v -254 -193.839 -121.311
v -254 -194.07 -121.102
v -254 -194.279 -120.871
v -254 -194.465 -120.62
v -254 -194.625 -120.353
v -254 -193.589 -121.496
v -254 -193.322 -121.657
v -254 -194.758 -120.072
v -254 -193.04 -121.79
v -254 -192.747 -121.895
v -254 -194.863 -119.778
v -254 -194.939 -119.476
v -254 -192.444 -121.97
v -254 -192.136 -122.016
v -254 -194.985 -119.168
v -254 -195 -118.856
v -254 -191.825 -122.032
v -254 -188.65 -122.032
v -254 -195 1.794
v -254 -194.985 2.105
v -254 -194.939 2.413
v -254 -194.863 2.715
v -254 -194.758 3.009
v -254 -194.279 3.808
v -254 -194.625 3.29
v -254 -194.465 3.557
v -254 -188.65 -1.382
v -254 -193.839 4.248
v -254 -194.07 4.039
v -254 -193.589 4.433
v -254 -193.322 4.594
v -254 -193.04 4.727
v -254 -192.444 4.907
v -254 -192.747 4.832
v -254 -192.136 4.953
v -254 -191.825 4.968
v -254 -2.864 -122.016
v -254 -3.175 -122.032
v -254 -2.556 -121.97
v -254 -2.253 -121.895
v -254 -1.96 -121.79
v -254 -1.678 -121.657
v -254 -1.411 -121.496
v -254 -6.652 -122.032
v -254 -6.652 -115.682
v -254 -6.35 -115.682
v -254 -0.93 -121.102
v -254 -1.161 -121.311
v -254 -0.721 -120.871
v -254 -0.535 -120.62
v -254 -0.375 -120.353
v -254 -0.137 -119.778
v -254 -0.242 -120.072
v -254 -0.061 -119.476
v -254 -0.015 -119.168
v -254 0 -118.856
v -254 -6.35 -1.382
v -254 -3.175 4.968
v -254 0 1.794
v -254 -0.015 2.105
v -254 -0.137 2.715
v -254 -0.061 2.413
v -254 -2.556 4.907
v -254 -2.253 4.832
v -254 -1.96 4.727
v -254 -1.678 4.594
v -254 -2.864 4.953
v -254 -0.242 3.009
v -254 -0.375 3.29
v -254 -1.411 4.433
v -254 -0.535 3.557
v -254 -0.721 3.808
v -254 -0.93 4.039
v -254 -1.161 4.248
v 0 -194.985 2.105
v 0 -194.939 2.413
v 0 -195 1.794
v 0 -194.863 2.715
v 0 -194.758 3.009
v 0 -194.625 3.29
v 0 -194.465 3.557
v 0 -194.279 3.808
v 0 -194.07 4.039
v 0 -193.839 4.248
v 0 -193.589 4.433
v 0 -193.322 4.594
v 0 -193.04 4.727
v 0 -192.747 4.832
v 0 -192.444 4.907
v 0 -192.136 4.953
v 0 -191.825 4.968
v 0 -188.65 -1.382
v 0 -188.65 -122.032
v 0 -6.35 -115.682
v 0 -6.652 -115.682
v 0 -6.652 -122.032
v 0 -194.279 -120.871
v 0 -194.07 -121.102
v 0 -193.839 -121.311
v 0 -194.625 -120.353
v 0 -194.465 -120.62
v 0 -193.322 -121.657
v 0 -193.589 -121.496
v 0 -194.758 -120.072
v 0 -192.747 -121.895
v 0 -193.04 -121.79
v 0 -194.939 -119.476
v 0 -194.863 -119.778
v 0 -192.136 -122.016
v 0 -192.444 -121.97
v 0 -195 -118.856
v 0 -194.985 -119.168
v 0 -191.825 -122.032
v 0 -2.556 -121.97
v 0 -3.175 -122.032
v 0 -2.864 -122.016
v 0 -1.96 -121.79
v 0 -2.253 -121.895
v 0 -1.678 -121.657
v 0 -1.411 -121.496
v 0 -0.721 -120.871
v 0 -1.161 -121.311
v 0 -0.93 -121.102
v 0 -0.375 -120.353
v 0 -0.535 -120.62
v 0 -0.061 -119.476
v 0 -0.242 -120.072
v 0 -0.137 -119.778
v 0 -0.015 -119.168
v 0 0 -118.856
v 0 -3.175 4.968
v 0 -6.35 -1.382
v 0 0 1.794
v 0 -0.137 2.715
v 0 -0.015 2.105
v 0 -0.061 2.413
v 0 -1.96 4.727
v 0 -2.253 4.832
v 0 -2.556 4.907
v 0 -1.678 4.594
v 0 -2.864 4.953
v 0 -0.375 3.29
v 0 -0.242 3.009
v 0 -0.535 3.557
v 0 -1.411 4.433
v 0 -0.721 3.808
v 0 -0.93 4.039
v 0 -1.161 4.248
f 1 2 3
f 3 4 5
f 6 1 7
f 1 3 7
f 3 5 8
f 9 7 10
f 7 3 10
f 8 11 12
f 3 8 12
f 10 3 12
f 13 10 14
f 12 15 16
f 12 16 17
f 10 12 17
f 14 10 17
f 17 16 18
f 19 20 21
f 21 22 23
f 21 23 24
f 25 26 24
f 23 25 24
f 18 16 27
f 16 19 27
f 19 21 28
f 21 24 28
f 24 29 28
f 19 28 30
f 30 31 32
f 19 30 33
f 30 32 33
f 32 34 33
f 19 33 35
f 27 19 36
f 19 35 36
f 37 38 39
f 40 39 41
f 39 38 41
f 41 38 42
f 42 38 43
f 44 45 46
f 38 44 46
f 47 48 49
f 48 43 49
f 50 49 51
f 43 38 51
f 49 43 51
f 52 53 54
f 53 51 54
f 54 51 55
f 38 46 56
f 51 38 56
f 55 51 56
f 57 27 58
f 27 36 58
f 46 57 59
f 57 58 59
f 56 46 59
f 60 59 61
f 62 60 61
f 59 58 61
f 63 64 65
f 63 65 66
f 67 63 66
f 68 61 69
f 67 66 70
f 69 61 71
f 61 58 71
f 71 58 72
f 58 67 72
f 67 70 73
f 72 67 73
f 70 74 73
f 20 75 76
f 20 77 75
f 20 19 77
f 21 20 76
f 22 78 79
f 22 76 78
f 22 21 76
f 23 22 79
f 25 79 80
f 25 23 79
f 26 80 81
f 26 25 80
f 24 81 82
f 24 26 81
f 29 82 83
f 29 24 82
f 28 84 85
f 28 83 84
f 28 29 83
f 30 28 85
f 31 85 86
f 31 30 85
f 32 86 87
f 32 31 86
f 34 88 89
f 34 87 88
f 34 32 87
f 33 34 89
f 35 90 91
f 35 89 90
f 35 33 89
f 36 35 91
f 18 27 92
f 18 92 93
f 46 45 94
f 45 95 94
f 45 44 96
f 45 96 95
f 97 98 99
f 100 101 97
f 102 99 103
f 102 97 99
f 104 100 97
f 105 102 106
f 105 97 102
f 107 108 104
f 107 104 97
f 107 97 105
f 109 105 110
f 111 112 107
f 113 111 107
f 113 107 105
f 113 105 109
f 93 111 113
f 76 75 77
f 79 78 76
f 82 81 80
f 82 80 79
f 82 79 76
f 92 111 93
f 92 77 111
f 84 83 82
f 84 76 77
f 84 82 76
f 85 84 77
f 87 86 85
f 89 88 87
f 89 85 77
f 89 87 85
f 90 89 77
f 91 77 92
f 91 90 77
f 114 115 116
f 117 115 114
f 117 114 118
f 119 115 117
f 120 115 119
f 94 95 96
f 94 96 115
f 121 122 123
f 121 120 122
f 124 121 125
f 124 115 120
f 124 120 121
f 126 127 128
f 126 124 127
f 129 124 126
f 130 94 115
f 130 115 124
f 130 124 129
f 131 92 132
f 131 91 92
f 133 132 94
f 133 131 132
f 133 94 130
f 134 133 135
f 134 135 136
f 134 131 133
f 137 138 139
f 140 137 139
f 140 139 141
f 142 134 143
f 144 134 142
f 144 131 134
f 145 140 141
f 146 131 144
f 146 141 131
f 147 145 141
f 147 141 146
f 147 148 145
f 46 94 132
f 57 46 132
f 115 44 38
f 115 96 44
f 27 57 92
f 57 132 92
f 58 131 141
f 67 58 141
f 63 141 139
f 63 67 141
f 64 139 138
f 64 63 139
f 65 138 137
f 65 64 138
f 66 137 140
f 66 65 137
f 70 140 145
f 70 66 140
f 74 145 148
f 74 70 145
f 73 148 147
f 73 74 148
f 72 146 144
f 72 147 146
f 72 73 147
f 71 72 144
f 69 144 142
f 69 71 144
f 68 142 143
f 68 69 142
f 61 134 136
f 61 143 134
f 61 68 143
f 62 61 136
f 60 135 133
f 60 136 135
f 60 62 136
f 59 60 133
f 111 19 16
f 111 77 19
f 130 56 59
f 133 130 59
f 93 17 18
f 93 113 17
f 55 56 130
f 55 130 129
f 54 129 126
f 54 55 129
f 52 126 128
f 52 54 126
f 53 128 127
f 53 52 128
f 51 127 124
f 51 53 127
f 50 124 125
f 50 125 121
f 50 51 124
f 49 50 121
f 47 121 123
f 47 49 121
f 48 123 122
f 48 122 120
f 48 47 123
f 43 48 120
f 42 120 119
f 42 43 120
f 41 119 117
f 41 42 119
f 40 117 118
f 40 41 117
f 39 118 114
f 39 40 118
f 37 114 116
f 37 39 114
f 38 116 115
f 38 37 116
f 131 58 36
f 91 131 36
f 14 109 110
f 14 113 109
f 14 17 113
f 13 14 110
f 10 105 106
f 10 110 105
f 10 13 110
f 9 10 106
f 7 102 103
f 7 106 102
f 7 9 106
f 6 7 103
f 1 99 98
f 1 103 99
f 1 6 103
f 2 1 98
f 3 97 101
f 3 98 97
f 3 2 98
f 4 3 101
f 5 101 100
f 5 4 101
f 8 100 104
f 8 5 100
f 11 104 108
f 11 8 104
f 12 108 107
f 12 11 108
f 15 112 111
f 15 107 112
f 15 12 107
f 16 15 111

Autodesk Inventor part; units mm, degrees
ref_plane "YZ Plane" through (0, 0, 0) normal (1, 0, 0) x (0, 1, 0)
ref_plane "XZ Plane" through (0, 0, 0) normal (0, 1, 0) x (-1, 0, 0)
ref_plane "XY Plane" through (0, 0, 0) normal (0, 0, 1) x (1, 0, 0)
sketch "Sketch14" plane through (0, 0, 0) normal (1, 0, 0) x (0, 1, 0)
  line L0 (0, 4.9685) -> (-195, 4.9685)
  line L1 (-195, 4.9685) -> (-195, -122.0315)
  line L2 (-195, -122.0315) -> (0, -122.0315)
  line L3 (0, -122.0315) -> (0, 4.9685)
  line L4 (-6.35, -1.3815) -> (-188.65, -1.3815)
  line L5 (-188.65, -1.3815) -> (-188.65, -115.6815)
  line L6 (-188.65, -115.6815) -> (-6.35, -115.6815)
  line L7 (-6.35, -115.6815) -> (-6.35, -1.3815)
  line L8 (0, 4.9685) -> (-195, 4.9685)
  point P0 (0, 0)
extrude "Extrusion10" add sketch "Sketch14" against normal blind 254
sketch "Sketch18" plane through (-254, 0, 0) normal (-1, 0, 0) x (0, 0, 1)
  line L0 (-1.3815, -188.65) -> (-115.6815, -188.65) projected
  line L1 (-122.0315, 0) -> (-122.0315, -195) projected
  line L2 (-115.6815, -188.65) -> (-122.0315, -188.65)
  line L3 (-122.0315, -188.65) -> (-122.0315, -6.6525)
  line L4 (-122.0315, -6.6525) -> (-115.6815, -6.6525)
  line L5 (-115.6815, -6.6525) -> (-115.6815, -188.65)
  point P0 (0, 0)
extrude "Extrusion14" cut sketch "Sketch18" against normal through all
fillet "Fillet3" radius 3.175 2 edges at (-127, 0, 4.9685) (-127, -195, 4.9685)
fillet "Fillet4" radius 3.175 2 edges at (-127, 0, -122.0315) (-127, -195, -122.0315)
properties part number "WingBoxCouple"
